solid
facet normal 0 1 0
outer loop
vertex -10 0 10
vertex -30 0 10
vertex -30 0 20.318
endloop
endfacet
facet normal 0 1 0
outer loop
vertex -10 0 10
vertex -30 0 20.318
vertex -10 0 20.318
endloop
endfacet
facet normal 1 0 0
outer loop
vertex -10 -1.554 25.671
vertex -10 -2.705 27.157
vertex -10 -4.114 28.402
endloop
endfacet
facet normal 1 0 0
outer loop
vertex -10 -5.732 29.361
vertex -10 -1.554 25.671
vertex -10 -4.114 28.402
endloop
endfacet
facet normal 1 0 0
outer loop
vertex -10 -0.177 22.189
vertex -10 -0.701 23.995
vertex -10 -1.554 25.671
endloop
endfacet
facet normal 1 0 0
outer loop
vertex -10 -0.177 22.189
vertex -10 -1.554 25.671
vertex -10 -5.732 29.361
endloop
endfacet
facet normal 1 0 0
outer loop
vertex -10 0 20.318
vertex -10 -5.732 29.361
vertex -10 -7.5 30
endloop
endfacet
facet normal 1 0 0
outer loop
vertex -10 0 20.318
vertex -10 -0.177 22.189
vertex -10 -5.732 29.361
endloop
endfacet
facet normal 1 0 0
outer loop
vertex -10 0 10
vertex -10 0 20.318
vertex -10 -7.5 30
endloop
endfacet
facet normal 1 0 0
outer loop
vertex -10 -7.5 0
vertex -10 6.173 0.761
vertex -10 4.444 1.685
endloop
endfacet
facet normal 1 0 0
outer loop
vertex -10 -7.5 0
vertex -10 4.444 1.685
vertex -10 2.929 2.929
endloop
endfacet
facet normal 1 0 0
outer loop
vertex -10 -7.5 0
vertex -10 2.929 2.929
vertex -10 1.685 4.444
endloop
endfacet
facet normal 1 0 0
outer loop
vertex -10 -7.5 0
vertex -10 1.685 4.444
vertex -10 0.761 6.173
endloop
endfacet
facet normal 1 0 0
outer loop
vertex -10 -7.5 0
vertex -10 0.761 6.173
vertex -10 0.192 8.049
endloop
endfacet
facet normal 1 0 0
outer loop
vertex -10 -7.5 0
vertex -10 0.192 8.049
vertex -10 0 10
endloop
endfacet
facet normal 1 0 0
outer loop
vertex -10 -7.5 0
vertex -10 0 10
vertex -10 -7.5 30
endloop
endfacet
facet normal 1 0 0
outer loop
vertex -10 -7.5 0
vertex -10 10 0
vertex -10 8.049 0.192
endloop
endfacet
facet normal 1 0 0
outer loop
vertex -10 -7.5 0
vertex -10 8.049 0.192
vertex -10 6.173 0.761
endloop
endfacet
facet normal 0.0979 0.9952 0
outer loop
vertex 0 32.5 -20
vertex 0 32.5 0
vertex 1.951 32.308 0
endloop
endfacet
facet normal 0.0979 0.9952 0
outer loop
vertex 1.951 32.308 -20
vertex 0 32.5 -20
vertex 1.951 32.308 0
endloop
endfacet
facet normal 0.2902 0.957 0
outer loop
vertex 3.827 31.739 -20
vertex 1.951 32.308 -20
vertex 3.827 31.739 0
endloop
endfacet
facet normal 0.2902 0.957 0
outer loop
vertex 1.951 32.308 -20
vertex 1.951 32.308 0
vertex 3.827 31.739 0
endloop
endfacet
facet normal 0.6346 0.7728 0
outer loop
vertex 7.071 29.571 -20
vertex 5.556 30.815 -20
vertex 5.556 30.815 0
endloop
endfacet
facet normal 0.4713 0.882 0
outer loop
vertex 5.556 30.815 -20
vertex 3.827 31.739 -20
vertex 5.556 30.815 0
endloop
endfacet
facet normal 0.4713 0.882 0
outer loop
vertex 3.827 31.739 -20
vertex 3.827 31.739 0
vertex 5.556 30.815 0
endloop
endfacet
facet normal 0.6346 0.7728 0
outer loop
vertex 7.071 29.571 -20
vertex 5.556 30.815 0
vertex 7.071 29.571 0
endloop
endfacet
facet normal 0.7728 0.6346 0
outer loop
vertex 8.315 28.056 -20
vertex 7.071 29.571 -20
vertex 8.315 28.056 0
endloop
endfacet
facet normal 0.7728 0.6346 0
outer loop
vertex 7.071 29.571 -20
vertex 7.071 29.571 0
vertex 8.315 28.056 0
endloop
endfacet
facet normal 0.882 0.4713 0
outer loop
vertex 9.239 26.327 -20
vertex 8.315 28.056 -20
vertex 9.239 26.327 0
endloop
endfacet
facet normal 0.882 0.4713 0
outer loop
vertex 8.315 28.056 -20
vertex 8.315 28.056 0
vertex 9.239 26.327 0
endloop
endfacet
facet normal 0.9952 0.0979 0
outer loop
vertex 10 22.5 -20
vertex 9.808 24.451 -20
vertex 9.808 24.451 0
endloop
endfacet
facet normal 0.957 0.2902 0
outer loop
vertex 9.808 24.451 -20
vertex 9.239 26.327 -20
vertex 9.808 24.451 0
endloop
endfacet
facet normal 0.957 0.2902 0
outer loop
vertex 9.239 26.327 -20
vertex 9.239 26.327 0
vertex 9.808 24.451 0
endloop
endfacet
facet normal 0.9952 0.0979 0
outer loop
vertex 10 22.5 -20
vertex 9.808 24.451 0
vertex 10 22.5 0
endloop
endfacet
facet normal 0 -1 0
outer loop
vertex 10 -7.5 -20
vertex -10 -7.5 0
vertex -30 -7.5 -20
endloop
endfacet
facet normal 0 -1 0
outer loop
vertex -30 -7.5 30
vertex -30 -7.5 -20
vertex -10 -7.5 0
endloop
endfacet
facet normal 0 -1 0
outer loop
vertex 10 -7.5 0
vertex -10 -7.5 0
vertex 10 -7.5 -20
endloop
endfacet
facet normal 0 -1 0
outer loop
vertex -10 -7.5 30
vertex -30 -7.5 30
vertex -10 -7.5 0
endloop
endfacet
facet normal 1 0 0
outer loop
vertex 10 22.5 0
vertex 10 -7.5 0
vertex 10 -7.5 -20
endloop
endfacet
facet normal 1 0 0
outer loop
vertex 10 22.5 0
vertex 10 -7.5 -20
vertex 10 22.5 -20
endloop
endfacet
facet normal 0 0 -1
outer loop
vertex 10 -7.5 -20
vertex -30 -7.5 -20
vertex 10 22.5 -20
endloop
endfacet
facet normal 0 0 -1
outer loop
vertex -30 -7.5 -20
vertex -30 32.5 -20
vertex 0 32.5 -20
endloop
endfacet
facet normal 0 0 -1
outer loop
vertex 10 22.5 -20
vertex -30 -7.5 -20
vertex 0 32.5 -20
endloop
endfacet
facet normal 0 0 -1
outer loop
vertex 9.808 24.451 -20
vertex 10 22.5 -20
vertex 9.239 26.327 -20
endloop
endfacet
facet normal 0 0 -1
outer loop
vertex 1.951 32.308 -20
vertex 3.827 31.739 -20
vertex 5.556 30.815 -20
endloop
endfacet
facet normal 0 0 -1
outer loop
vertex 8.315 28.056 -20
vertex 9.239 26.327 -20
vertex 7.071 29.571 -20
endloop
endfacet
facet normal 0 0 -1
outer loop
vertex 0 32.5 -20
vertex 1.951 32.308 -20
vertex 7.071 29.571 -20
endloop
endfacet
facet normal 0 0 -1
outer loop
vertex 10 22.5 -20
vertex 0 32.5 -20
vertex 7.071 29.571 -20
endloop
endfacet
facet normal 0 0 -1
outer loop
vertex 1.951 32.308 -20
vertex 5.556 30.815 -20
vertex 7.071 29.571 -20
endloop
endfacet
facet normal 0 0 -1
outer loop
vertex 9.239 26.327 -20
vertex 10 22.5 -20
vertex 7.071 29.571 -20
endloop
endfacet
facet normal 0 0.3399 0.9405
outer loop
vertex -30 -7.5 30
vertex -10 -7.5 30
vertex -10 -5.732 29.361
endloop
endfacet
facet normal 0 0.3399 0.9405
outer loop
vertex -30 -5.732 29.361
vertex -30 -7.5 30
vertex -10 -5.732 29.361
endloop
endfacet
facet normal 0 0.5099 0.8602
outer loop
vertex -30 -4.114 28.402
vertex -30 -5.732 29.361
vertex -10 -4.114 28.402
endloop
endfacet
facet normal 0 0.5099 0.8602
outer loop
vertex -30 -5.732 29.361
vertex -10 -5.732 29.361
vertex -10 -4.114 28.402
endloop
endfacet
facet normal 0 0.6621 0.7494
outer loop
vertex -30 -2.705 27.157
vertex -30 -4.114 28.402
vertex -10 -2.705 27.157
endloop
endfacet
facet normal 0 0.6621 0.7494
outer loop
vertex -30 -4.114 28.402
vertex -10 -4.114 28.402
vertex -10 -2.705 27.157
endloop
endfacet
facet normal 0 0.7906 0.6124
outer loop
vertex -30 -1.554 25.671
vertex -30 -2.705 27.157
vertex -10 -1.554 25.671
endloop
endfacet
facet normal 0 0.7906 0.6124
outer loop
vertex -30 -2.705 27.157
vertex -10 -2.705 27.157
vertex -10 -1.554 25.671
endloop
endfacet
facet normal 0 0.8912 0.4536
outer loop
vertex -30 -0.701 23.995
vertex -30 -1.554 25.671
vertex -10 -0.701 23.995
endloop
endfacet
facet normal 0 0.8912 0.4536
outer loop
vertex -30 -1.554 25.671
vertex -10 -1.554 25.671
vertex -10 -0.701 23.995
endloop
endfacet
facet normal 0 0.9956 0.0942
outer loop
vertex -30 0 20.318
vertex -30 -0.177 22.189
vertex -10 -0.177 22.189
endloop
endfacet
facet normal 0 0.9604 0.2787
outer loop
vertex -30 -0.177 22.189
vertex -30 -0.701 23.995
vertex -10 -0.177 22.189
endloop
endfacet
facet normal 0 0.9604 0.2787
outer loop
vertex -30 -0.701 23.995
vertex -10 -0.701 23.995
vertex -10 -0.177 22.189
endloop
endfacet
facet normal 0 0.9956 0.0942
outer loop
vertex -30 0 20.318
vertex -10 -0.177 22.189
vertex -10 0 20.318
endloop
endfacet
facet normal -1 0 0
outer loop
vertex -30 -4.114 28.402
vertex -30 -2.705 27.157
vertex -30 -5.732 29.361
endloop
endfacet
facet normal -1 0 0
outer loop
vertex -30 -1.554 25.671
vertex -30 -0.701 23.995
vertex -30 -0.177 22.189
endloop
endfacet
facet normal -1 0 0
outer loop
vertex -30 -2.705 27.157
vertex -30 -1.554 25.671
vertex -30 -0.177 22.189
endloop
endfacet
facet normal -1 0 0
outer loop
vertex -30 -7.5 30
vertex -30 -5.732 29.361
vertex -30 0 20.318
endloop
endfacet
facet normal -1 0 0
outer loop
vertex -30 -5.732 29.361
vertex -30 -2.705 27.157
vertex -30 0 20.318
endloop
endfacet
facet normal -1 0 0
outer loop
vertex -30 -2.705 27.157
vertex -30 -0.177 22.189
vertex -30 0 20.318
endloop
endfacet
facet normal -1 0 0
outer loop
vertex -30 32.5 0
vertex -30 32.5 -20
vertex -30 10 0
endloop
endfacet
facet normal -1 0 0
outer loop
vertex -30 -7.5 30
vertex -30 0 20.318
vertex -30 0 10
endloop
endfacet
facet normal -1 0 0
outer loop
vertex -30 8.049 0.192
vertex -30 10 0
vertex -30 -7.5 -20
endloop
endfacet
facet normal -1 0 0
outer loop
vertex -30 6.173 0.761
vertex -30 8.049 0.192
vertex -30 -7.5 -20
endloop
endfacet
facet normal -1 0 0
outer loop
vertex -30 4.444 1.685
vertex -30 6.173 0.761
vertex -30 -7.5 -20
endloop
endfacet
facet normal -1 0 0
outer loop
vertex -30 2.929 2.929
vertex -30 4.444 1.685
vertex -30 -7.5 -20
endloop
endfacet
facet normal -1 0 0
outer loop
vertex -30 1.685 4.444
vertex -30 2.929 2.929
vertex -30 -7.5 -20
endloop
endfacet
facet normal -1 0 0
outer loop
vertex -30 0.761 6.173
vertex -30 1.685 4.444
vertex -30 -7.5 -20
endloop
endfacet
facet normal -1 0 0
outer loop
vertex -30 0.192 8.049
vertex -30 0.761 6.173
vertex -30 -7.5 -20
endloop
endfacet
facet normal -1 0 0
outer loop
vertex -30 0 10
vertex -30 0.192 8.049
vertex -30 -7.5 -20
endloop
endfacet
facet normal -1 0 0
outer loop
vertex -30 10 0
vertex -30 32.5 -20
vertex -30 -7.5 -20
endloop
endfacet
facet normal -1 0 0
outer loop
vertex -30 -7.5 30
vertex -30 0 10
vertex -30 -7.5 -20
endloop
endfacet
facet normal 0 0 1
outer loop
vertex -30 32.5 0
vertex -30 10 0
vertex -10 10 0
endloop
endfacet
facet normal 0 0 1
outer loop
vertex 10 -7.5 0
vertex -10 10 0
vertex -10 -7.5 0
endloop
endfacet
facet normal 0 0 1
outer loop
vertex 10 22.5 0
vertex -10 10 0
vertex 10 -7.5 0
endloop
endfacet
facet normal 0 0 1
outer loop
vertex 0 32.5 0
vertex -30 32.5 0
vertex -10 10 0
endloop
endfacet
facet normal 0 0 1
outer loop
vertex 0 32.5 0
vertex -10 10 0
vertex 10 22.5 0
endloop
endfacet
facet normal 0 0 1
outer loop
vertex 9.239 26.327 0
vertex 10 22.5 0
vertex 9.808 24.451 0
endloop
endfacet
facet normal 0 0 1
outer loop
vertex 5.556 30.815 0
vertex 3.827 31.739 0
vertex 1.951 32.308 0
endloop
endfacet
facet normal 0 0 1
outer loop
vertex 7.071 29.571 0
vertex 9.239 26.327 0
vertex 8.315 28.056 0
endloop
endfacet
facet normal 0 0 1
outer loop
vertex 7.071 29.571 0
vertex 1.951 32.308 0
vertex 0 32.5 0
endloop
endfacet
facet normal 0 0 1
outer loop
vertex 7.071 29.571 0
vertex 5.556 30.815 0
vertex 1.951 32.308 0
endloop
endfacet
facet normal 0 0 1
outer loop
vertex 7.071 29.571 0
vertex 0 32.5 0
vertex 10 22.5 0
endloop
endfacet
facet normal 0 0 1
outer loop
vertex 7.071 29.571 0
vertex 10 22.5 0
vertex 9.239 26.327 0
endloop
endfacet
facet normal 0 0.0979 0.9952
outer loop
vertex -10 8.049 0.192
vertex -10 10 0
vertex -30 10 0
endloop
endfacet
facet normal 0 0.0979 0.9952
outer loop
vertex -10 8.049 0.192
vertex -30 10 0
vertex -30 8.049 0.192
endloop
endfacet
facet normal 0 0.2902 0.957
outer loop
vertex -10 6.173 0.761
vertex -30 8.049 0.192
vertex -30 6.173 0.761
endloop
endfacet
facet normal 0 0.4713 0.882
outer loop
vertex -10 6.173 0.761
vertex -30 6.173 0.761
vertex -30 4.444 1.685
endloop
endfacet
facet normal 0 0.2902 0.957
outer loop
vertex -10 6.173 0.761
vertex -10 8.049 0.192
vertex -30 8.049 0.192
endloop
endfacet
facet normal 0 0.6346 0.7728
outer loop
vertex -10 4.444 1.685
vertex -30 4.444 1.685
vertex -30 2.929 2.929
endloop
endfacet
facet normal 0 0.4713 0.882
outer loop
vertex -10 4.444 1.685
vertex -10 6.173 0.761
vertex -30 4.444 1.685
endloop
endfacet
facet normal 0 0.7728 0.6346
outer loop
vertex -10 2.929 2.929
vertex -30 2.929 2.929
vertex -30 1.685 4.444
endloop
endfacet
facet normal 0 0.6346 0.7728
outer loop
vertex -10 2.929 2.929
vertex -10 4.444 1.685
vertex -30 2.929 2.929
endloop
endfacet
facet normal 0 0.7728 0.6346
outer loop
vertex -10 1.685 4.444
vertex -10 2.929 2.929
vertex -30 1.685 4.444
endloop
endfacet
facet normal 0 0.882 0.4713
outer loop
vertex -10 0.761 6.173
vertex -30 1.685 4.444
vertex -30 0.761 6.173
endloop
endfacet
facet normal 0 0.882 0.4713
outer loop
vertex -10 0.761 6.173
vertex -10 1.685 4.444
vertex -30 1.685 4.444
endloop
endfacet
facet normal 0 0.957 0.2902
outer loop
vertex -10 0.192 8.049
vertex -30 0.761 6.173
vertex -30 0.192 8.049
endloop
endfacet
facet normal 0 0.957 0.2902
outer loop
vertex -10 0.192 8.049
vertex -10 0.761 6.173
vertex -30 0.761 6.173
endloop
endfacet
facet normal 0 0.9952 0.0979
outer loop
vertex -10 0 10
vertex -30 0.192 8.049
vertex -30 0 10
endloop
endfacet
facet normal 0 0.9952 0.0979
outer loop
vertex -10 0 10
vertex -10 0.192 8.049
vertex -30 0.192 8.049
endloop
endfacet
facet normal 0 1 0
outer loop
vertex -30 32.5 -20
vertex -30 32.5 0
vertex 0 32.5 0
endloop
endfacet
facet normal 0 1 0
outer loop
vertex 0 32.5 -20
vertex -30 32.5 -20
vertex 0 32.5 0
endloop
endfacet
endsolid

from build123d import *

# Parameters (mm, degrees)
SKETCH1_W           = 20
SKETCH1_H           = 7.5
BOSS_EXTRUDE1_DEPTH = 30
SKETCH2_W           = 40
SKETCH2_H           = 40
BOSS_EXTRUDE2_DEPTH = 20
FILLET1_R           = 10


with BuildPart() as part:
    # Sketch1 → Boss-Extrude1 (new body)
    with BuildSketch(Plane.XY):
        with Locations((-20, -3.75)):
            Rectangle(SKETCH1_W, SKETCH1_H)
    extrude(amount=BOSS_EXTRUDE1_DEPTH)

    # Sketch2 → Boss-Extrude2 (add)
    with BuildSketch(Plane.XY):
        with Locations((-10, 12.5)):
            Rectangle(SKETCH2_W, SKETCH2_H)
    extrude(amount=-BOSS_EXTRUDE2_DEPTH)

    # Fillet1
    # the kernel refuses this fillet: 10 mm, written as the material it adds along each edge
    with BuildSketch(Plane(origin=(-10, 0, 0), x_dir=(0, 1, 0), z_dir=(-1, 0, 0))) as fillet1_piece_1:
        with BuildLine():
            CenterArc((FILLET1_R, -FILLET1_R), FILLET1_R, 90, 90)
            Line((0, -FILLET1_R), (0, 0))
            Line((0, 0), (FILLET1_R, 0))
        make_face()
    extrude(amount=20)
    # the kernel refuses this fillet: 10 mm, written as the material it takes off along each edge
    with BuildSketch(Plane(origin=(10, 32.5, 25), x_dir=(-1, 0, 0), z_dir=(0, 0, -1))) as fillet1_2_piece_1:
        with BuildLine():
            CenterArc((FILLET1_R, -FILLET1_R), FILLET1_R, 90, 90)
            Line((0, -FILLET1_R), (0, 0))
            Line((0, 0), (FILLET1_R, 0))
        make_face()
    extrude(amount=70, mode=Mode.SUBTRACT)
    with BuildSketch(Plane(origin=(14.206145914, 0, 30), x_dir=(0, 0, -1), z_dir=(-1, 0, 0))) as fillet1_2_piece_2:
        with BuildLine():
            CenterArc((9.682458366, 10), FILLET1_R, 194.477512186, 75.522487814)
            Line((0, 7.5), (0, 0))
            Line((0, 0), (9.682458366, 0))
        make_face()
    extrude(amount=68.412291828, mode=Mode.SUBTRACT)


solid = part.part
